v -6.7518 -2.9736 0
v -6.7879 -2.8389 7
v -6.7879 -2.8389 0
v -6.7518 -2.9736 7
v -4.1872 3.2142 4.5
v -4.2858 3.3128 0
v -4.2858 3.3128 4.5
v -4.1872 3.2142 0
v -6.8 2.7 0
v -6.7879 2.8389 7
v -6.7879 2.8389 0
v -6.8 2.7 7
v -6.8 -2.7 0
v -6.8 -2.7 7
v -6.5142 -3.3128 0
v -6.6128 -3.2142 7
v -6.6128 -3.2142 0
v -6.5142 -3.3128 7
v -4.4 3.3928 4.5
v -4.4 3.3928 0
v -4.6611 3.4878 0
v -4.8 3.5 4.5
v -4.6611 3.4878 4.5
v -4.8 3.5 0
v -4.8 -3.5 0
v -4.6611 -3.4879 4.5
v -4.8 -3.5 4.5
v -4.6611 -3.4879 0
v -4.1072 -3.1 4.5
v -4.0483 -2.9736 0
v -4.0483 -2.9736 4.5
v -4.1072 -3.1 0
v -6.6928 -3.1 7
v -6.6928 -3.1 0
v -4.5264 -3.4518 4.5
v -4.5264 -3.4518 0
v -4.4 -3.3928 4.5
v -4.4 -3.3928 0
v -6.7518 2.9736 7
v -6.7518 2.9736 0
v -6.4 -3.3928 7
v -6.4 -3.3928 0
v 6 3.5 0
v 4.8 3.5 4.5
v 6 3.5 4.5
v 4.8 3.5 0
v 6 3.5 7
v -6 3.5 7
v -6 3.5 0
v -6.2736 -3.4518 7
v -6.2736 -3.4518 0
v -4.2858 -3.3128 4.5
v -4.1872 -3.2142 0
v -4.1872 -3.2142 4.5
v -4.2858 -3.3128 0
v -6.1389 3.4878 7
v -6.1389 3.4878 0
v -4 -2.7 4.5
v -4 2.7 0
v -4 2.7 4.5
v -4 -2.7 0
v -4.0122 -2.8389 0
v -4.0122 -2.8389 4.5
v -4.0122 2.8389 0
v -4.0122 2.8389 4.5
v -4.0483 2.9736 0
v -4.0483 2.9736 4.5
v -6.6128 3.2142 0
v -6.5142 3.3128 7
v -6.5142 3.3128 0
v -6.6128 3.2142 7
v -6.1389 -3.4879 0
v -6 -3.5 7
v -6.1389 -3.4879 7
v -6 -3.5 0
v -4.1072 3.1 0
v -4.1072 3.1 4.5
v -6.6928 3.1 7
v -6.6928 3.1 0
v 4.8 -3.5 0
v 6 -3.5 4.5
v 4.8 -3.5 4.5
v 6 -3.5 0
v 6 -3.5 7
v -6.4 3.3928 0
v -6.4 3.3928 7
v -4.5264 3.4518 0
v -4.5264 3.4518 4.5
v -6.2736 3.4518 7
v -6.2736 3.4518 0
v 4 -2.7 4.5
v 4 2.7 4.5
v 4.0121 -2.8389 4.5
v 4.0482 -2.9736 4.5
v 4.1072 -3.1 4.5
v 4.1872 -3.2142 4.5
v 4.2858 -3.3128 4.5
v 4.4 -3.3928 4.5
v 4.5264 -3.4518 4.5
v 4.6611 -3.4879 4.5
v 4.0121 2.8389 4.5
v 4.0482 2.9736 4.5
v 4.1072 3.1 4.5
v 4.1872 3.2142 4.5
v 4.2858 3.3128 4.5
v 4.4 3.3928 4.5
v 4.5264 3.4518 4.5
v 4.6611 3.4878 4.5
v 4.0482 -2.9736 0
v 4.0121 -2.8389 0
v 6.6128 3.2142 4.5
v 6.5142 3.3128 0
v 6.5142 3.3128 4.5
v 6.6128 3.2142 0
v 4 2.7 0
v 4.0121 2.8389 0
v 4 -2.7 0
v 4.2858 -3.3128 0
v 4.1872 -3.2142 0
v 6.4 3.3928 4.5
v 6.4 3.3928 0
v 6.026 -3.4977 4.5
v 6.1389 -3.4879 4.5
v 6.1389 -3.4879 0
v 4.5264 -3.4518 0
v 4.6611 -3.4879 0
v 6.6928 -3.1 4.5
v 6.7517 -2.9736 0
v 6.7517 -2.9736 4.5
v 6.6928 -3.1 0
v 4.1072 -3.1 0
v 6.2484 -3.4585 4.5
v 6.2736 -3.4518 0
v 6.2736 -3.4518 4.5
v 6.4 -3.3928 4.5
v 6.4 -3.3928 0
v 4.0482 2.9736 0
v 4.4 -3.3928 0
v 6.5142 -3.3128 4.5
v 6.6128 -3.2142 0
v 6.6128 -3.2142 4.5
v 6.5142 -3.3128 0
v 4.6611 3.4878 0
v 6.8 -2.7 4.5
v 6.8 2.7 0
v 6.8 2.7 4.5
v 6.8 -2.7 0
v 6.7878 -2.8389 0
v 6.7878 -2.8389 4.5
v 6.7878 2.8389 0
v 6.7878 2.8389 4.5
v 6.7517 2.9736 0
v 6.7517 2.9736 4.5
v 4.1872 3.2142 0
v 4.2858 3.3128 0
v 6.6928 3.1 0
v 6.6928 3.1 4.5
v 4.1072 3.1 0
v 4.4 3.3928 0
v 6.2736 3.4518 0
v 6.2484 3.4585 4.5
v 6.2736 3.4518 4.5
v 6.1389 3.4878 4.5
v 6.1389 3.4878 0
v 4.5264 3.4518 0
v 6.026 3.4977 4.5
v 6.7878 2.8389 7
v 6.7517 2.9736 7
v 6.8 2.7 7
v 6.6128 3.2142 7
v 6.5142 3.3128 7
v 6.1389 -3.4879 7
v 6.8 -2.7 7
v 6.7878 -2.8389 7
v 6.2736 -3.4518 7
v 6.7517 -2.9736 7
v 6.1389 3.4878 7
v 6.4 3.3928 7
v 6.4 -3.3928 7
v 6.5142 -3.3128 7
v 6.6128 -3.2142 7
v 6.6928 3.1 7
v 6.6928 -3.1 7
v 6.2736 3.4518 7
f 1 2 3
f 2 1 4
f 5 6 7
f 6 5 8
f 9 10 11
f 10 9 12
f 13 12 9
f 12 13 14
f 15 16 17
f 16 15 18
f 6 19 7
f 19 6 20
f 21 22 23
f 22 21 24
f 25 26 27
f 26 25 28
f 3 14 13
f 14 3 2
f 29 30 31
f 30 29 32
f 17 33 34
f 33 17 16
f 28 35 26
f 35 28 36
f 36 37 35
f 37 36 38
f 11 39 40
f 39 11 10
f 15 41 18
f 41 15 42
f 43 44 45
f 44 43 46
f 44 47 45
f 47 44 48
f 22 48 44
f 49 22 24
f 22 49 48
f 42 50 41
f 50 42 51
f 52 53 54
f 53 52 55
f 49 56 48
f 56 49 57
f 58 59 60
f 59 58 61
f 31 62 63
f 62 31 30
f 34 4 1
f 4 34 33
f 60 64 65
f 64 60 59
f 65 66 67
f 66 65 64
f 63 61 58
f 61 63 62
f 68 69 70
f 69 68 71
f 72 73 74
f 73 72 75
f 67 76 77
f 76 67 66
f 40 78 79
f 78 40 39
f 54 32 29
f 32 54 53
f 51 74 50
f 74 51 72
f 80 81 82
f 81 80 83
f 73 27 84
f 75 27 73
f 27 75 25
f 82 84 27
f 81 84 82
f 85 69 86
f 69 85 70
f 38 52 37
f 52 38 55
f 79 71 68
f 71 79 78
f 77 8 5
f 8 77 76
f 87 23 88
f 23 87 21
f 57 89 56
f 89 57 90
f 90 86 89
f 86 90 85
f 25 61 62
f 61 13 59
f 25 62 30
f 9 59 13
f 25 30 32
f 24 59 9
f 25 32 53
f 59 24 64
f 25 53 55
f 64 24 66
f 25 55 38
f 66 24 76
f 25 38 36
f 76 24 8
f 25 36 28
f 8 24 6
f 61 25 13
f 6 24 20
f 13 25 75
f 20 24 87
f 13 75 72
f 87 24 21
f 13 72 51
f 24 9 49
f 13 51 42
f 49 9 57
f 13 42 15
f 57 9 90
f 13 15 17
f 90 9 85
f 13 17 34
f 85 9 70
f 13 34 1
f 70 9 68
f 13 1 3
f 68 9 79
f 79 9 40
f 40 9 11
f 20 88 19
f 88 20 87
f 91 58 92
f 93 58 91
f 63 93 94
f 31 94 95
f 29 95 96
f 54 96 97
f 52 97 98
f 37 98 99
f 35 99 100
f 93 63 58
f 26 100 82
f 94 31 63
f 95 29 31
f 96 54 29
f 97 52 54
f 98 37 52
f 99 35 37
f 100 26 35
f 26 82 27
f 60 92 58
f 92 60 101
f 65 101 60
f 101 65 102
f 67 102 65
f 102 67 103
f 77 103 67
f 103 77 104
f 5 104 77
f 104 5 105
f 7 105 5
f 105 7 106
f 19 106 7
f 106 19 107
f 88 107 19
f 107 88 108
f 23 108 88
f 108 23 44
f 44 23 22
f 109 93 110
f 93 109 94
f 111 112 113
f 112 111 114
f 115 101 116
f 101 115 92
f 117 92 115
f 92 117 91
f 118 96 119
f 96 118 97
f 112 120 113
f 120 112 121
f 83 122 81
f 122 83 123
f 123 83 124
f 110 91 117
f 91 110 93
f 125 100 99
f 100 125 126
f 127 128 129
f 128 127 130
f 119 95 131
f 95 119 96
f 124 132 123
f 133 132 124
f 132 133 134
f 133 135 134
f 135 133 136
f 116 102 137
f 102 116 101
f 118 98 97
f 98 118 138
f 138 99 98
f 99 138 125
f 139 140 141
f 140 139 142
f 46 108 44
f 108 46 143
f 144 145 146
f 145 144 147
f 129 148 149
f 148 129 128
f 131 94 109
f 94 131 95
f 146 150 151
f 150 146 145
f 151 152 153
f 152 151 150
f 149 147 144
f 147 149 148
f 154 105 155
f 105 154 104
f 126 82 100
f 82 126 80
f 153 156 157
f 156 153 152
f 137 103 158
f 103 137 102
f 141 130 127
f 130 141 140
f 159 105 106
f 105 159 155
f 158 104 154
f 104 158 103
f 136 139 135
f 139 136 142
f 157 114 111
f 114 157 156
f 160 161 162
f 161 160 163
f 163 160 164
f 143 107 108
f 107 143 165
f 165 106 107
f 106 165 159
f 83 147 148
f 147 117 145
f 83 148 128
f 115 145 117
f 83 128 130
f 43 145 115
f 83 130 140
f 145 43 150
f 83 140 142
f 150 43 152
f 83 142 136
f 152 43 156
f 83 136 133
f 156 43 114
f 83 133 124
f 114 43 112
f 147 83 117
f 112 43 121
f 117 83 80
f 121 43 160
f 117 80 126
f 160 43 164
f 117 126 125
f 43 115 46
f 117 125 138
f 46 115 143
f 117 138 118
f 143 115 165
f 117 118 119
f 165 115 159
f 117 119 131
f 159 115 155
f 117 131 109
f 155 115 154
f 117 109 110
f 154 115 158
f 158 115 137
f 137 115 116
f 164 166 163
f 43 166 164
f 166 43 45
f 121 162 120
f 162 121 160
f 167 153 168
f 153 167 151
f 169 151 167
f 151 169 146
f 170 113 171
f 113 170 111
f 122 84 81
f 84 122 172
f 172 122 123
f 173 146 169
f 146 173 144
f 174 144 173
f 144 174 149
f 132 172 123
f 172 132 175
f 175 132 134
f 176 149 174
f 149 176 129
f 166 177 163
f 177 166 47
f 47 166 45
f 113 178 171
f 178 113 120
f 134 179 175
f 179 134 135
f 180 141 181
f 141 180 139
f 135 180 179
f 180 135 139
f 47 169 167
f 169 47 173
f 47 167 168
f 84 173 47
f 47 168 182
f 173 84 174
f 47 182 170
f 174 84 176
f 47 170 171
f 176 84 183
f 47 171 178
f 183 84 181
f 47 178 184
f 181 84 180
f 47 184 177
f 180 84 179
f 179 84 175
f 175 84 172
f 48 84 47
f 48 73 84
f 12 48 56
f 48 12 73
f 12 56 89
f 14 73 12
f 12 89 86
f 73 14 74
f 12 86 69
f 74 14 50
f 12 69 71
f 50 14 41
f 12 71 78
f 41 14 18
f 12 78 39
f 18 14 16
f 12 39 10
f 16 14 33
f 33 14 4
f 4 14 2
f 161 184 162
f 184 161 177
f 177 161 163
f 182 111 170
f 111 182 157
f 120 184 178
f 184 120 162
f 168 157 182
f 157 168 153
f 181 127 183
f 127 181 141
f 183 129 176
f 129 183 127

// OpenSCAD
// Reusable serviceable open-top cable-tie saddle.
// Design intent:
// - PCB or other hardware can already be installed.
// - The zip tie path remains visible and accessible from above.
// - The feature is internal-only and does not cut exterior walls.

$fn = 36;

zip_tie_band_width = 4.0;
zip_tie_band_thickness = 1.4;
zip_tie_tunnel_clear_width = 5.5;
zip_tie_tunnel_clear_height = 3.0;
zip_tie_bridge_thickness = 2.5;
zip_tie_bridge_top_height = 7.0;
zip_tie_bridge_span = 8.0;
zip_tie_bridge_length_along_y = 7.0;
zip_tie_foot_width = 2.8;
zip_tie_foot_length = 7.0;

wire_bundle_preview_diameter = 4.0;
show_zip_tie_path_preview = true;
show_wire_bundle_preview = true;

function saddle_total_width() = zip_tie_bridge_span + 2 * zip_tie_foot_width;

module rounded_rect_2d(w, d, r) {
    rr = max(0.01, min(r, min(w, d) / 2 - 0.01));
    hull() {
        for (x = [rr, w - rr])
            for (y = [rr, d - rr])
                translate([x, y])
                    circle(r = rr);
    }
}

module rounded_block(size, r = 1.0) {
    linear_extrude(height = size[2])
        rounded_rect_2d(size[0], size[1], r);
}

module cable_tie_saddle_tunnel_cut() {
    translate([
        -zip_tie_tunnel_clear_width / 2,
        -zip_tie_foot_length / 2 - 0.35,
        -0.02
    ])
        cube([
            zip_tie_tunnel_clear_width,
            zip_tie_foot_length + 0.7,
            zip_tie_tunnel_clear_height + 0.04
        ]);
}

module serviceable_cable_tie_saddle() {
    total_x = saddle_total_width();
    bridge_bottom = zip_tie_bridge_top_height - zip_tie_bridge_thickness;
    foot_h = max(zip_tie_tunnel_clear_height, bridge_bottom);
    foot_y = max(zip_tie_foot_length, zip_tie_bridge_length_along_y);

    difference() {
        union() {
            translate([-total_x / 2, -foot_y / 2, 0])
                rounded_block([zip_tie_foot_width, foot_y, foot_h], 0.8);

            translate([total_x / 2 - zip_tie_foot_width, -foot_y / 2, 0])
                rounded_block([zip_tie_foot_width, foot_y, foot_h], 0.8);

            translate([
                -total_x / 2,
                -zip_tie_bridge_length_along_y / 2,
                bridge_bottom
            ])
                rounded_block([
                    total_x,
                    zip_tie_bridge_length_along_y,
                    zip_tie_bridge_thickness
                ], 0.8);
        }

        cable_tie_saddle_tunnel_cut();
    }
}

module zip_tie_path_preview() {
    if (show_zip_tie_path_preview)
        %color([0.1, 0.8, 1.0, 0.35])
            translate([
                -zip_tie_band_width / 2,
                -zip_tie_bridge_length_along_y / 2 - 1.3,
                0.25
            ])
                cube([
                    zip_tie_band_width,
                    zip_tie_bridge_length_along_y + 2.6,
                    zip_tie_band_thickness
                ]);
}

module wire_bundle_preview() {
    if (show_wire_bundle_preview)
        %color([1.0, 0.35, 0.05, 0.30])
            translate([
                0,
                0,
                zip_tie_bridge_top_height + wire_bundle_preview_diameter / 2
            ])
                rotate([0, 90, 0])
                    cylinder(
                        h = saddle_total_width() + 3.0,
                        d = wire_bundle_preview_diameter,
                        center = true
                    );
}

serviceable_cable_tie_saddle();
zip_tie_path_preview();
wire_bundle_preview();
